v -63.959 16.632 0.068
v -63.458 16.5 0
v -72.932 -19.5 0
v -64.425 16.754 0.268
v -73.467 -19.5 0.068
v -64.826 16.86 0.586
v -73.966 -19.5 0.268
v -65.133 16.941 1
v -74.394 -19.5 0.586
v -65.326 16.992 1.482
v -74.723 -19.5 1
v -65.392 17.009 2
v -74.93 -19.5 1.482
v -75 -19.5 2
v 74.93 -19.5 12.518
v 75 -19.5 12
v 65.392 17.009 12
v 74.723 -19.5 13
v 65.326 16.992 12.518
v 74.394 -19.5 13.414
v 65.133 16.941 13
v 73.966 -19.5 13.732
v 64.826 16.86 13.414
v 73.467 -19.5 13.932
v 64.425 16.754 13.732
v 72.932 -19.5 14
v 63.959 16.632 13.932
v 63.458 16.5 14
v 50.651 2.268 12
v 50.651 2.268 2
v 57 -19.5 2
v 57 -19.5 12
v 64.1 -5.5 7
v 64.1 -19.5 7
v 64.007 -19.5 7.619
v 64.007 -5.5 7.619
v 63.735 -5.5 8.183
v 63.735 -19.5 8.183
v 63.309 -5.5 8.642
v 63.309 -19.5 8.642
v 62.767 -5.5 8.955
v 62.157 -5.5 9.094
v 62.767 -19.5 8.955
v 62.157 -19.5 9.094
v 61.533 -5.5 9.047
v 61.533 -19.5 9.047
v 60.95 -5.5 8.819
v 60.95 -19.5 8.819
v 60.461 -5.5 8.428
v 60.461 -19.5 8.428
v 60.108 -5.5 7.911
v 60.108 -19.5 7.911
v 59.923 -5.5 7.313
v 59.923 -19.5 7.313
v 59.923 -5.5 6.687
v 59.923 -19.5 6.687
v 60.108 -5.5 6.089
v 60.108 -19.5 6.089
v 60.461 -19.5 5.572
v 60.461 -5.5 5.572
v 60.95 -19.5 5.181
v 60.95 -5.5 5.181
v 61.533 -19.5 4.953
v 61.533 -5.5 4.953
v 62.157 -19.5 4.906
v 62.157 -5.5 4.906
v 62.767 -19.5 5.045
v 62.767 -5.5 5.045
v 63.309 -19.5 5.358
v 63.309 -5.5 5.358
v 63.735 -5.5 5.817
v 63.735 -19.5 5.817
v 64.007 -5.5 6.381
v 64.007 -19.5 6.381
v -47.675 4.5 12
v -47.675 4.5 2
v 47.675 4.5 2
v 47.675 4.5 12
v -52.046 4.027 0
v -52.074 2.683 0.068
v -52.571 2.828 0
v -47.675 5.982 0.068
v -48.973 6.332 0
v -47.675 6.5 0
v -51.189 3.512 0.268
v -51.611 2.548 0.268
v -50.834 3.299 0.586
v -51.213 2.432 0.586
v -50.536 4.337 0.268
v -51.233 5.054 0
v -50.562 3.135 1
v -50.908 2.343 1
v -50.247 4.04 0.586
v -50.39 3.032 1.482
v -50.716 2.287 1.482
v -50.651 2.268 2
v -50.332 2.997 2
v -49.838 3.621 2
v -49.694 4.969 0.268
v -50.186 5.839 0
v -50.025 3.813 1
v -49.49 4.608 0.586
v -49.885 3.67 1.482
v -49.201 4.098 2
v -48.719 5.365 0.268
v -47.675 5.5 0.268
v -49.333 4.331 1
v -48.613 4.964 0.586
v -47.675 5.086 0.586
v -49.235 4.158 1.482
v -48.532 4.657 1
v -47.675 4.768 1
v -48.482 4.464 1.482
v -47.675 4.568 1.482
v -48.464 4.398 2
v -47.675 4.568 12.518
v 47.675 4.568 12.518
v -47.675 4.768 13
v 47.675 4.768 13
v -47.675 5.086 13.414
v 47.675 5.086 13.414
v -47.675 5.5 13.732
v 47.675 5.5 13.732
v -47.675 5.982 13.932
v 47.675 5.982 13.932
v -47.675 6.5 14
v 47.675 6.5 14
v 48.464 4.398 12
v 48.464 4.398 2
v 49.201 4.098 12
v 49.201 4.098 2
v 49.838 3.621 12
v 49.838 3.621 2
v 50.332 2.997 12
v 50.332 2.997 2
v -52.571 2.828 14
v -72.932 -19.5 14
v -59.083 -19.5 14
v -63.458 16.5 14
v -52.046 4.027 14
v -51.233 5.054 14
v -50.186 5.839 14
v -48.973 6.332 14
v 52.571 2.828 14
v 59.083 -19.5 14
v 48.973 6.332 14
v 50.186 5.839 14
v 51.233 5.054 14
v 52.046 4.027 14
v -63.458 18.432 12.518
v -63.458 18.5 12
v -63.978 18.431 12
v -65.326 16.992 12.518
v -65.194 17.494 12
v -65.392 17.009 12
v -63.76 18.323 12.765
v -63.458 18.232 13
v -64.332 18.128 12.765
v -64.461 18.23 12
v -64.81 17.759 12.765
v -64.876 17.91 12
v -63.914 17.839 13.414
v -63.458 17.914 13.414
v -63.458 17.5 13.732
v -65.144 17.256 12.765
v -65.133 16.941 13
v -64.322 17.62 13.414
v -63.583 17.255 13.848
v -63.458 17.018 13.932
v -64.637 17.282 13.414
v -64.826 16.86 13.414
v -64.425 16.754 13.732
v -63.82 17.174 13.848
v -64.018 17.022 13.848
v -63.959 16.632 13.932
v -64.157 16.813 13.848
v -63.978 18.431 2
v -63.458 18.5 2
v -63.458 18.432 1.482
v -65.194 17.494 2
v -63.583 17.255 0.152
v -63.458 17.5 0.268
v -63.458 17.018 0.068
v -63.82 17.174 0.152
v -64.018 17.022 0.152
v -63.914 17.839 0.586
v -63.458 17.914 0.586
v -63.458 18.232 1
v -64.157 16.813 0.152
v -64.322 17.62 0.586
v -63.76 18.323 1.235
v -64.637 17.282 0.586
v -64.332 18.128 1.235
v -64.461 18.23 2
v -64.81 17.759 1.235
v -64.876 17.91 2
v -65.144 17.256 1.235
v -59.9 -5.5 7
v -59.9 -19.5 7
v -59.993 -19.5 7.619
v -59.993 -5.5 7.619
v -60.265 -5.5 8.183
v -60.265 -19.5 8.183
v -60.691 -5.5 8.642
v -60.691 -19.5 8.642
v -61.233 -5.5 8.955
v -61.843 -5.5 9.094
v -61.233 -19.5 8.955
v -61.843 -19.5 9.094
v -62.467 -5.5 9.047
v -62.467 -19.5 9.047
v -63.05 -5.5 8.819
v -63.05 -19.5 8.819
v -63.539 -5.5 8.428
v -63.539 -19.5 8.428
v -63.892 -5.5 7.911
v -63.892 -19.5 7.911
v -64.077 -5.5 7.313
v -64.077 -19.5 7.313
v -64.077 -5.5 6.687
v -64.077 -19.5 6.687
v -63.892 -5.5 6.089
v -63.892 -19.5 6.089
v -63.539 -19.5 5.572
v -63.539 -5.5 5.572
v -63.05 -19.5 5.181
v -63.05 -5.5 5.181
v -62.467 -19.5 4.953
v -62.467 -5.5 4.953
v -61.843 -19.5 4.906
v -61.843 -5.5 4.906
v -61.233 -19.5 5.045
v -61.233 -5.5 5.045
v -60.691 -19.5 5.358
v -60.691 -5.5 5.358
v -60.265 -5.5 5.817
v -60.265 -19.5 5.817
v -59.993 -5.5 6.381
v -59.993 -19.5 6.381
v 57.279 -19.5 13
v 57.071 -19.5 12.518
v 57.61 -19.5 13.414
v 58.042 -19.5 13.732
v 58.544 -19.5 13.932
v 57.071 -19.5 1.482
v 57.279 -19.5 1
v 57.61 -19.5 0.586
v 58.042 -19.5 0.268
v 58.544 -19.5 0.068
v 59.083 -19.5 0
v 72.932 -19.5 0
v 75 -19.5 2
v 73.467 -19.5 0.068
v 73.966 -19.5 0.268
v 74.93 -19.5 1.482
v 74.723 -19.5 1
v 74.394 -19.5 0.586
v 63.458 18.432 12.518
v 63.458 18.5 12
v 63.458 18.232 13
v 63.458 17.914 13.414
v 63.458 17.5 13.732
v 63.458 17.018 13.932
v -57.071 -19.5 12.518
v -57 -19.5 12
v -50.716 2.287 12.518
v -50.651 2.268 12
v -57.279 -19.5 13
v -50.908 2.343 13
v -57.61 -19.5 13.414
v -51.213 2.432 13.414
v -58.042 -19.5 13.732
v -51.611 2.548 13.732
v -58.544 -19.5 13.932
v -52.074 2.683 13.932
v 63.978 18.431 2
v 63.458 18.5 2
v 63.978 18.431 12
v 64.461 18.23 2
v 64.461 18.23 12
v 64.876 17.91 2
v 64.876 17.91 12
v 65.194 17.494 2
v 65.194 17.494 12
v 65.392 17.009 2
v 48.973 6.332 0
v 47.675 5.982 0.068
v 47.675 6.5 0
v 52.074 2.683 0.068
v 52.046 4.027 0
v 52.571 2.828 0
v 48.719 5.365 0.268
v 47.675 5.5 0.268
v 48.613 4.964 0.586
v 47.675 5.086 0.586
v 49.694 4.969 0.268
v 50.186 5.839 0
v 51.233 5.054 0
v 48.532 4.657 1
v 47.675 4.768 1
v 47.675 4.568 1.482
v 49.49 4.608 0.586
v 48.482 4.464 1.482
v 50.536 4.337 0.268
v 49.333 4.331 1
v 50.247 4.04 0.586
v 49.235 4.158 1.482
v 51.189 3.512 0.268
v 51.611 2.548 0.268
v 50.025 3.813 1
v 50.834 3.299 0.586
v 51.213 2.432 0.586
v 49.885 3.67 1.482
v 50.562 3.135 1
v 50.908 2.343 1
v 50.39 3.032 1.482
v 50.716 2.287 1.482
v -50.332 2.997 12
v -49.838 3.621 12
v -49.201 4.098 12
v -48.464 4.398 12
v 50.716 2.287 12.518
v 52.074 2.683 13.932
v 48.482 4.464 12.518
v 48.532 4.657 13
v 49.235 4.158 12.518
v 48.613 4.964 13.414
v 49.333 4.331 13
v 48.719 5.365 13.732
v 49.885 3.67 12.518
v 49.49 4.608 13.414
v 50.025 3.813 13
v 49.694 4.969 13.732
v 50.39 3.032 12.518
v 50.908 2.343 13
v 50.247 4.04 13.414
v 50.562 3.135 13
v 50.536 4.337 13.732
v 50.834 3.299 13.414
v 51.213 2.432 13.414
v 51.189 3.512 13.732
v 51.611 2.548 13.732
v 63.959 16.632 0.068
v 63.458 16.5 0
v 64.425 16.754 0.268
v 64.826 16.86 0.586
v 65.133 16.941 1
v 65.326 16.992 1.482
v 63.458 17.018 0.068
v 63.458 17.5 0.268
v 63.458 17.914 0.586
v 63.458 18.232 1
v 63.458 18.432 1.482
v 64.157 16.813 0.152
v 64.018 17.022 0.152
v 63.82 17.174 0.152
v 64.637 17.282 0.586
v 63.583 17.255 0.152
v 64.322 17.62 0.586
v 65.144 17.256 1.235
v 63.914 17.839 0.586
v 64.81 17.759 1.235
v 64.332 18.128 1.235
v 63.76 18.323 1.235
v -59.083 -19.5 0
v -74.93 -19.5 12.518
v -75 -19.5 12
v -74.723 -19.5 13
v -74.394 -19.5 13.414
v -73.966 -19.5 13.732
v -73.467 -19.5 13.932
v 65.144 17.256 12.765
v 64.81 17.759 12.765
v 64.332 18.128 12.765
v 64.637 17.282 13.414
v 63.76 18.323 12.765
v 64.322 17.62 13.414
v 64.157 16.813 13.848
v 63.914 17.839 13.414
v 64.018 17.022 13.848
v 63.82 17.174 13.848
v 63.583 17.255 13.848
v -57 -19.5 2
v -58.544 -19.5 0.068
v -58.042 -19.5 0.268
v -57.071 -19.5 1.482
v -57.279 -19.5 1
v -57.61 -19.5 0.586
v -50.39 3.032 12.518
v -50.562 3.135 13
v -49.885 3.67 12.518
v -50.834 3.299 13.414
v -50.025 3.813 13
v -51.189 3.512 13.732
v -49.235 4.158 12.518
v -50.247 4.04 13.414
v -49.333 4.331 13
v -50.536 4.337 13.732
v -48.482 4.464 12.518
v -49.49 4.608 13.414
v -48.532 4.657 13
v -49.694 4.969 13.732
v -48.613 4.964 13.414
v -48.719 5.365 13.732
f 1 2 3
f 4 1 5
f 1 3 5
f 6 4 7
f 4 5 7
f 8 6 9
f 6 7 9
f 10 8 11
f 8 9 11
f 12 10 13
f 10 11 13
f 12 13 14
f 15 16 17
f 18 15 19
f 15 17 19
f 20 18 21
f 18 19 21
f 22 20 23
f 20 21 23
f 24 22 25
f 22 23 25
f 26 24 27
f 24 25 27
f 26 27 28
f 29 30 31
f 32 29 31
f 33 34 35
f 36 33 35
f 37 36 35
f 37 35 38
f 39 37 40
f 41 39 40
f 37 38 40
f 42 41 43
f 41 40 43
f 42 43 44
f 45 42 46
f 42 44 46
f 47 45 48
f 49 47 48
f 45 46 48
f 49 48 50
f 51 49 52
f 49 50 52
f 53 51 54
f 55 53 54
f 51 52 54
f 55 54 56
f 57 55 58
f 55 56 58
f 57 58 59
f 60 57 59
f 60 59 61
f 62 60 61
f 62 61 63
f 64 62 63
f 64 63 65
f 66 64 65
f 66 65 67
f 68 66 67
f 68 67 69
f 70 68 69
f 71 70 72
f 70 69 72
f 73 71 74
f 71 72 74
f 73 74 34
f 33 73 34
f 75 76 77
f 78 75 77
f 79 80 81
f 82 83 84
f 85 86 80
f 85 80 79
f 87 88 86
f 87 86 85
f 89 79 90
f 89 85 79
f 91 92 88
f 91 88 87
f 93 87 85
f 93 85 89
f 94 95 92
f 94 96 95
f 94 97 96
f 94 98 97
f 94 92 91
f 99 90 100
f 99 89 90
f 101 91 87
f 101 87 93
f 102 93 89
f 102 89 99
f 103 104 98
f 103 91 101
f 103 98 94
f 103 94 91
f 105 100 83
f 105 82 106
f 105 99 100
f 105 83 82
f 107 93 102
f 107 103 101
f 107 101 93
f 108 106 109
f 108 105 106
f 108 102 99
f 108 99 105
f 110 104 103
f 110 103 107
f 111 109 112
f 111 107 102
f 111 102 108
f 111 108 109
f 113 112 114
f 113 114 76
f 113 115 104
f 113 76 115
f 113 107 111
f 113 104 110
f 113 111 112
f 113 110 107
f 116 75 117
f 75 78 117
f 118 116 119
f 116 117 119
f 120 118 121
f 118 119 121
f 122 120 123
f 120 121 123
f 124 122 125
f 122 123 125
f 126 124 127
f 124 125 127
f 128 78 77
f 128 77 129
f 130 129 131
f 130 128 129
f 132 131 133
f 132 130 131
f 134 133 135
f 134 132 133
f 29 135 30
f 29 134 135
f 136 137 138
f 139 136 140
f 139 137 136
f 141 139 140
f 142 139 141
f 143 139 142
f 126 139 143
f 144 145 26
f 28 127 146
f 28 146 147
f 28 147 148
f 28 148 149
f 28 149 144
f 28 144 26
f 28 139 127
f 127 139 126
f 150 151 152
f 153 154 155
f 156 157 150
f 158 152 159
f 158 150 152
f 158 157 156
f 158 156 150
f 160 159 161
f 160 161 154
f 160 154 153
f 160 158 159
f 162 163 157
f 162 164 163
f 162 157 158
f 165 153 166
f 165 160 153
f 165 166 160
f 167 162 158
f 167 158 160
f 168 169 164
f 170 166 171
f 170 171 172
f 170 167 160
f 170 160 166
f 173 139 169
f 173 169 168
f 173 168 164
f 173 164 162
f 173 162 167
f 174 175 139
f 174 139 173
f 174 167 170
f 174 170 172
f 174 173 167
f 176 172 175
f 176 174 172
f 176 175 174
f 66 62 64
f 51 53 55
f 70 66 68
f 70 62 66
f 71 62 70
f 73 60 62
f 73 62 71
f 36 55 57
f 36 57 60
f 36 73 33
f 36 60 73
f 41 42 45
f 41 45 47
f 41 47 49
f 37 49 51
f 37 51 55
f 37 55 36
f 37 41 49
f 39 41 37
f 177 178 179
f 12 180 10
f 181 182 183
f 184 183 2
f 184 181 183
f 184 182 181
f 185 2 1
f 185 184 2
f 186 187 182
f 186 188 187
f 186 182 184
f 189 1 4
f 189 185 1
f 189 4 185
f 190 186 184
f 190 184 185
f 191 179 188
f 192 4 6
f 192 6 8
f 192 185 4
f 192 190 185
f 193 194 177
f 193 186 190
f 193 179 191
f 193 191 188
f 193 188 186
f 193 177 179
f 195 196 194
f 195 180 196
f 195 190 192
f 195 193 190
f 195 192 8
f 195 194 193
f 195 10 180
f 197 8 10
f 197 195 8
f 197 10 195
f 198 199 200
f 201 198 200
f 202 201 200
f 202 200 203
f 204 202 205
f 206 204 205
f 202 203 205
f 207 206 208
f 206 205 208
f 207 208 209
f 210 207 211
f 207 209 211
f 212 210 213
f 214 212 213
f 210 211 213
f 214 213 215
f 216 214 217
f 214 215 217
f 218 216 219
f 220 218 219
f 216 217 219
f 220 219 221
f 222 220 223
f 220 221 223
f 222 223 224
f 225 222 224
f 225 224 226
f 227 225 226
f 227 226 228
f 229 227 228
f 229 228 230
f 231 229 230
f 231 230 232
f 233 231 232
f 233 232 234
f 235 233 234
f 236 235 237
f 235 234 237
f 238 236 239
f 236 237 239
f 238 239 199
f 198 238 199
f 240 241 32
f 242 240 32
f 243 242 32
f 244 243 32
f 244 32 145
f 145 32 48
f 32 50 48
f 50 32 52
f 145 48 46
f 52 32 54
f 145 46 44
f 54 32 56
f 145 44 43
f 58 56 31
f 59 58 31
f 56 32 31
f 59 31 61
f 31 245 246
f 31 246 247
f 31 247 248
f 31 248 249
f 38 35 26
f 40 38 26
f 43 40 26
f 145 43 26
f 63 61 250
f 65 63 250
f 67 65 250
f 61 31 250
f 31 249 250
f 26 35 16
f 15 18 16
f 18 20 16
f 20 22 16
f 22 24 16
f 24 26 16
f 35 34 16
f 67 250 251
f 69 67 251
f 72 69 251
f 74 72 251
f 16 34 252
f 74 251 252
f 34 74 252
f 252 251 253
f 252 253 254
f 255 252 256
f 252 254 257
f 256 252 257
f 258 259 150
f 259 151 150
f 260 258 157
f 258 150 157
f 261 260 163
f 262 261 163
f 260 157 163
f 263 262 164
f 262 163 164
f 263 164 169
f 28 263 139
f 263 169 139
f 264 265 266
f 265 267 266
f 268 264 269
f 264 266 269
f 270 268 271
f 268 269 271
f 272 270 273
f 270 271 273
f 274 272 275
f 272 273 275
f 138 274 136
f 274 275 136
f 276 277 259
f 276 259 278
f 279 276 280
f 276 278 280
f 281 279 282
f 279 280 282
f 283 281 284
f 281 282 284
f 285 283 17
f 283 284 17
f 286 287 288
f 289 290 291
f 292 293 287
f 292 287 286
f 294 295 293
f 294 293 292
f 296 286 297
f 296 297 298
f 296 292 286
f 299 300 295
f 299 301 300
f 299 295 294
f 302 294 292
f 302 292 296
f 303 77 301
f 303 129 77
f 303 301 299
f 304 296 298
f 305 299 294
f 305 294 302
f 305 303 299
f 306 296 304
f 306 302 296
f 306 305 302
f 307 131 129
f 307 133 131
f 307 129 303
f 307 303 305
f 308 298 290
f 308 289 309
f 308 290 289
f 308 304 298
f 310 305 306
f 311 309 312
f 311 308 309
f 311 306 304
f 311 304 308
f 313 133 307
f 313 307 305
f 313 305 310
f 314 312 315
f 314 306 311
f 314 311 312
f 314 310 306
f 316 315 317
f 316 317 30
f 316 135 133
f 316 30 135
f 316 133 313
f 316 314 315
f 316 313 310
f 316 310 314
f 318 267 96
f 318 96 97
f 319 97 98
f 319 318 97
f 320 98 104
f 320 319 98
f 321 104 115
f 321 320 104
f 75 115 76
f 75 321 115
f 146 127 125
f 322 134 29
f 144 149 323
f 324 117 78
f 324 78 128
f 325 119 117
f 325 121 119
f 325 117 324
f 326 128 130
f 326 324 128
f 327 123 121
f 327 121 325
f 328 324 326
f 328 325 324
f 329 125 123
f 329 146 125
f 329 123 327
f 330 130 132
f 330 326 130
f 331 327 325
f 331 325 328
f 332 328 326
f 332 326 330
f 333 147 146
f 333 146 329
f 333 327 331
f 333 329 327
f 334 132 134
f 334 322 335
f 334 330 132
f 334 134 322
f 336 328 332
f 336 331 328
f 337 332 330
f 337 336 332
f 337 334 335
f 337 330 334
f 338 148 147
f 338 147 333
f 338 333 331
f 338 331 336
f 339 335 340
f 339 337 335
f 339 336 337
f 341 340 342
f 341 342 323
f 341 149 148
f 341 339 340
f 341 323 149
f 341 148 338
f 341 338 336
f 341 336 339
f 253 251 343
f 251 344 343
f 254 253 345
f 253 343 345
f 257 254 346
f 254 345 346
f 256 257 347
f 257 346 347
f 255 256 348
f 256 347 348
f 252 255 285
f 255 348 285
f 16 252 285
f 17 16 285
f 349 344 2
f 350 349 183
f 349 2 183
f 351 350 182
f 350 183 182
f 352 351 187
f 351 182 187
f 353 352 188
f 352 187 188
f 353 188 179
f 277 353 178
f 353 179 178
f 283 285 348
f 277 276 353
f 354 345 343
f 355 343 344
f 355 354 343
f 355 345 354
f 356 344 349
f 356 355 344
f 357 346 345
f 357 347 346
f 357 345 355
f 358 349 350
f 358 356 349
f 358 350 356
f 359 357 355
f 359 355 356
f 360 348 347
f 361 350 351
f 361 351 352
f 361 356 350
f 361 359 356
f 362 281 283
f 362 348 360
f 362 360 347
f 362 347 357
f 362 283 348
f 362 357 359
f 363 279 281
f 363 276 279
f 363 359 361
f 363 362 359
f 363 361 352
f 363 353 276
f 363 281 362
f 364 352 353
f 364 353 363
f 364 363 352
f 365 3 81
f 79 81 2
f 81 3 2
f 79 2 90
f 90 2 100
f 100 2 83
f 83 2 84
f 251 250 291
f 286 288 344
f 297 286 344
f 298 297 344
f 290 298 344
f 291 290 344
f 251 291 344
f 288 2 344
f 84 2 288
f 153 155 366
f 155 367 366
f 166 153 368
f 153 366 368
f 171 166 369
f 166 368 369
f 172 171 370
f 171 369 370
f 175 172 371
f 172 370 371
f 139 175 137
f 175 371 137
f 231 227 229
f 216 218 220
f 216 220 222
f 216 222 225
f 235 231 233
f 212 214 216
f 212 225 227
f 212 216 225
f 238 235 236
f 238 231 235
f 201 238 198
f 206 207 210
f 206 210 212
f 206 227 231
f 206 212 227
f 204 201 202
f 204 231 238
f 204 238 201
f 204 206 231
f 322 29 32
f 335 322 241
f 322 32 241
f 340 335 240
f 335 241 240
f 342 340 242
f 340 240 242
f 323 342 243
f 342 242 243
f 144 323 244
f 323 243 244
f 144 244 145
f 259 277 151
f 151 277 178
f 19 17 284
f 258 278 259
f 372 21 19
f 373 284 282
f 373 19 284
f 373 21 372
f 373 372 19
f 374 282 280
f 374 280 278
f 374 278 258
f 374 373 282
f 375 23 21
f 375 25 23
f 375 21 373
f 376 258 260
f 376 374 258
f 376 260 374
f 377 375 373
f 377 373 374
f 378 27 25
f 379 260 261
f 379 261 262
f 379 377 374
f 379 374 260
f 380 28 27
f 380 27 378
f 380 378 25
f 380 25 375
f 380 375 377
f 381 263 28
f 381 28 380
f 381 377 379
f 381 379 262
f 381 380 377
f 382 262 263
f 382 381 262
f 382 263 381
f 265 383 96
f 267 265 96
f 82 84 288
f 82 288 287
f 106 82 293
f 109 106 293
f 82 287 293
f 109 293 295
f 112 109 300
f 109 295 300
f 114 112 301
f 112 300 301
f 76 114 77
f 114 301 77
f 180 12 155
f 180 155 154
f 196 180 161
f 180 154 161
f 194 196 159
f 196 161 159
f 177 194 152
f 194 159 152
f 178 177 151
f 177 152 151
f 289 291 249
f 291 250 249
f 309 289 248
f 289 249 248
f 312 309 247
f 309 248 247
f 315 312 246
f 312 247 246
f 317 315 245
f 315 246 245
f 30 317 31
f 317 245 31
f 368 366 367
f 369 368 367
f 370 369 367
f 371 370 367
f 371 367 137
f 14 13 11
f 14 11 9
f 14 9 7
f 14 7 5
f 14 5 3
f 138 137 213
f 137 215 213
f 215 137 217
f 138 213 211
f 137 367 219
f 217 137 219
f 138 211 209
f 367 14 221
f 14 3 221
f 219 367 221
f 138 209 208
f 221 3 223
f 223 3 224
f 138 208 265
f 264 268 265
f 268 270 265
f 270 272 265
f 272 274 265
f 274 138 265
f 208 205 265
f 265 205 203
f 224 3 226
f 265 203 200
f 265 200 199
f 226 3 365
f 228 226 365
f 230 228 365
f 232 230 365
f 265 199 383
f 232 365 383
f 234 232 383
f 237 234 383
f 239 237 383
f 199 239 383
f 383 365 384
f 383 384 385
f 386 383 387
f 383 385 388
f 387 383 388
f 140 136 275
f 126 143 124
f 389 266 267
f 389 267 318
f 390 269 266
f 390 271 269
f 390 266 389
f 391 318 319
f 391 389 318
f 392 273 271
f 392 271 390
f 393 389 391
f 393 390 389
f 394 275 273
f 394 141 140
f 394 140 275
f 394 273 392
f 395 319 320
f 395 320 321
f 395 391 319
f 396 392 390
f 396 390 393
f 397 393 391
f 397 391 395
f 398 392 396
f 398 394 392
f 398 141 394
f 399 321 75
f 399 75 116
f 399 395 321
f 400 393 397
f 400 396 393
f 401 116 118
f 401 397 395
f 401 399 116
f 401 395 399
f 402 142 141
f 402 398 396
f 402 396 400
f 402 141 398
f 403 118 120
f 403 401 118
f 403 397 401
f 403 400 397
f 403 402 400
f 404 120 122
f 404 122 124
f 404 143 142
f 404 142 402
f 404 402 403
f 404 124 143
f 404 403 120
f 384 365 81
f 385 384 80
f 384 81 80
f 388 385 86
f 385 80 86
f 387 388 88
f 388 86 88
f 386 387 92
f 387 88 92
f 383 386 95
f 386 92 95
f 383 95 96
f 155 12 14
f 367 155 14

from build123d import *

# Parameters (mm, degrees)
F1_DEPTH = 14
F2_R     = 2.1
F3_DEPTH = 14
F4_R     = 2
F5_R     = 3.1
F6_R     = 2


with BuildPart() as f1:
    # F0 (on Top) → F1 (new body)
    with BuildSketch(Plane.XY):
        Polygon((-65, 18.5), (-75, -19.5), (-57, -19.5), (-50, 4.5), (0, 4.5), (50, 4.5), (57, -19.5), (75, -19.5), (65, 18.5), (0, 18.5), align=None)
    extrude(amount=F1_DEPTH)

    # F2 (on face) → F3 (cut)
    with BuildSketch(Plane.XZ.offset(19.5)):
        with Locations((-62, 7)):
            Circle(F2_R)
        with Locations((62, 7)):
            Circle(F2_R)
    extrude(amount=-F3_DEPTH, mode=Mode.SUBTRACT)

    # F4
    f4_edges = [f1.edges().sort_by_distance(p)[0] for p in [
        (65, 18.5, 7),
        (-65, 18.5, 7),
    ]]
    fillet(f4_edges, radius=F4_R)

    # F5
    f5_edges = [f1.edges().sort_by_distance(p)[0] for p in [
        (50, 4.5, 7),
        (-50, 4.5, 7),
    ]]
    fillet(f5_edges, radius=F5_R)

    # F6
    f6_edges = [f1.edges().sort_by_distance(p)[0] for p in [
        (0, 18.5, 0),
        (-64.679293, 18.083978, 0),
        (-70.196186, -1.245507, 0),
        (64.679293, 18.083978, 0),
        (70.196186, -1.245507, 0),
        (53.8255, -8.616, 0),
        (49.535, 3.88, 0),
        (0, 4.5, 0),
        (-49.535, 3.88, 0),
        (-53.8255, -8.616, 0),
        (-70.196186, -1.245507, 14),
        (-64.679293, 18.083978, 14),
        (0, 18.5, 14),
        (64.679293, 18.083978, 14),
        (70.196186, -1.245507, 14),
        (49.535, 3.88, 14),
        (0, 4.5, 14),
        (53.8255, -8.616, 14),
        (-49.535, 3.88, 14),
        (-53.8255, -8.616, 14),
    ]]
    fillet(f6_edges, radius=F6_R)


solid = f1.part
